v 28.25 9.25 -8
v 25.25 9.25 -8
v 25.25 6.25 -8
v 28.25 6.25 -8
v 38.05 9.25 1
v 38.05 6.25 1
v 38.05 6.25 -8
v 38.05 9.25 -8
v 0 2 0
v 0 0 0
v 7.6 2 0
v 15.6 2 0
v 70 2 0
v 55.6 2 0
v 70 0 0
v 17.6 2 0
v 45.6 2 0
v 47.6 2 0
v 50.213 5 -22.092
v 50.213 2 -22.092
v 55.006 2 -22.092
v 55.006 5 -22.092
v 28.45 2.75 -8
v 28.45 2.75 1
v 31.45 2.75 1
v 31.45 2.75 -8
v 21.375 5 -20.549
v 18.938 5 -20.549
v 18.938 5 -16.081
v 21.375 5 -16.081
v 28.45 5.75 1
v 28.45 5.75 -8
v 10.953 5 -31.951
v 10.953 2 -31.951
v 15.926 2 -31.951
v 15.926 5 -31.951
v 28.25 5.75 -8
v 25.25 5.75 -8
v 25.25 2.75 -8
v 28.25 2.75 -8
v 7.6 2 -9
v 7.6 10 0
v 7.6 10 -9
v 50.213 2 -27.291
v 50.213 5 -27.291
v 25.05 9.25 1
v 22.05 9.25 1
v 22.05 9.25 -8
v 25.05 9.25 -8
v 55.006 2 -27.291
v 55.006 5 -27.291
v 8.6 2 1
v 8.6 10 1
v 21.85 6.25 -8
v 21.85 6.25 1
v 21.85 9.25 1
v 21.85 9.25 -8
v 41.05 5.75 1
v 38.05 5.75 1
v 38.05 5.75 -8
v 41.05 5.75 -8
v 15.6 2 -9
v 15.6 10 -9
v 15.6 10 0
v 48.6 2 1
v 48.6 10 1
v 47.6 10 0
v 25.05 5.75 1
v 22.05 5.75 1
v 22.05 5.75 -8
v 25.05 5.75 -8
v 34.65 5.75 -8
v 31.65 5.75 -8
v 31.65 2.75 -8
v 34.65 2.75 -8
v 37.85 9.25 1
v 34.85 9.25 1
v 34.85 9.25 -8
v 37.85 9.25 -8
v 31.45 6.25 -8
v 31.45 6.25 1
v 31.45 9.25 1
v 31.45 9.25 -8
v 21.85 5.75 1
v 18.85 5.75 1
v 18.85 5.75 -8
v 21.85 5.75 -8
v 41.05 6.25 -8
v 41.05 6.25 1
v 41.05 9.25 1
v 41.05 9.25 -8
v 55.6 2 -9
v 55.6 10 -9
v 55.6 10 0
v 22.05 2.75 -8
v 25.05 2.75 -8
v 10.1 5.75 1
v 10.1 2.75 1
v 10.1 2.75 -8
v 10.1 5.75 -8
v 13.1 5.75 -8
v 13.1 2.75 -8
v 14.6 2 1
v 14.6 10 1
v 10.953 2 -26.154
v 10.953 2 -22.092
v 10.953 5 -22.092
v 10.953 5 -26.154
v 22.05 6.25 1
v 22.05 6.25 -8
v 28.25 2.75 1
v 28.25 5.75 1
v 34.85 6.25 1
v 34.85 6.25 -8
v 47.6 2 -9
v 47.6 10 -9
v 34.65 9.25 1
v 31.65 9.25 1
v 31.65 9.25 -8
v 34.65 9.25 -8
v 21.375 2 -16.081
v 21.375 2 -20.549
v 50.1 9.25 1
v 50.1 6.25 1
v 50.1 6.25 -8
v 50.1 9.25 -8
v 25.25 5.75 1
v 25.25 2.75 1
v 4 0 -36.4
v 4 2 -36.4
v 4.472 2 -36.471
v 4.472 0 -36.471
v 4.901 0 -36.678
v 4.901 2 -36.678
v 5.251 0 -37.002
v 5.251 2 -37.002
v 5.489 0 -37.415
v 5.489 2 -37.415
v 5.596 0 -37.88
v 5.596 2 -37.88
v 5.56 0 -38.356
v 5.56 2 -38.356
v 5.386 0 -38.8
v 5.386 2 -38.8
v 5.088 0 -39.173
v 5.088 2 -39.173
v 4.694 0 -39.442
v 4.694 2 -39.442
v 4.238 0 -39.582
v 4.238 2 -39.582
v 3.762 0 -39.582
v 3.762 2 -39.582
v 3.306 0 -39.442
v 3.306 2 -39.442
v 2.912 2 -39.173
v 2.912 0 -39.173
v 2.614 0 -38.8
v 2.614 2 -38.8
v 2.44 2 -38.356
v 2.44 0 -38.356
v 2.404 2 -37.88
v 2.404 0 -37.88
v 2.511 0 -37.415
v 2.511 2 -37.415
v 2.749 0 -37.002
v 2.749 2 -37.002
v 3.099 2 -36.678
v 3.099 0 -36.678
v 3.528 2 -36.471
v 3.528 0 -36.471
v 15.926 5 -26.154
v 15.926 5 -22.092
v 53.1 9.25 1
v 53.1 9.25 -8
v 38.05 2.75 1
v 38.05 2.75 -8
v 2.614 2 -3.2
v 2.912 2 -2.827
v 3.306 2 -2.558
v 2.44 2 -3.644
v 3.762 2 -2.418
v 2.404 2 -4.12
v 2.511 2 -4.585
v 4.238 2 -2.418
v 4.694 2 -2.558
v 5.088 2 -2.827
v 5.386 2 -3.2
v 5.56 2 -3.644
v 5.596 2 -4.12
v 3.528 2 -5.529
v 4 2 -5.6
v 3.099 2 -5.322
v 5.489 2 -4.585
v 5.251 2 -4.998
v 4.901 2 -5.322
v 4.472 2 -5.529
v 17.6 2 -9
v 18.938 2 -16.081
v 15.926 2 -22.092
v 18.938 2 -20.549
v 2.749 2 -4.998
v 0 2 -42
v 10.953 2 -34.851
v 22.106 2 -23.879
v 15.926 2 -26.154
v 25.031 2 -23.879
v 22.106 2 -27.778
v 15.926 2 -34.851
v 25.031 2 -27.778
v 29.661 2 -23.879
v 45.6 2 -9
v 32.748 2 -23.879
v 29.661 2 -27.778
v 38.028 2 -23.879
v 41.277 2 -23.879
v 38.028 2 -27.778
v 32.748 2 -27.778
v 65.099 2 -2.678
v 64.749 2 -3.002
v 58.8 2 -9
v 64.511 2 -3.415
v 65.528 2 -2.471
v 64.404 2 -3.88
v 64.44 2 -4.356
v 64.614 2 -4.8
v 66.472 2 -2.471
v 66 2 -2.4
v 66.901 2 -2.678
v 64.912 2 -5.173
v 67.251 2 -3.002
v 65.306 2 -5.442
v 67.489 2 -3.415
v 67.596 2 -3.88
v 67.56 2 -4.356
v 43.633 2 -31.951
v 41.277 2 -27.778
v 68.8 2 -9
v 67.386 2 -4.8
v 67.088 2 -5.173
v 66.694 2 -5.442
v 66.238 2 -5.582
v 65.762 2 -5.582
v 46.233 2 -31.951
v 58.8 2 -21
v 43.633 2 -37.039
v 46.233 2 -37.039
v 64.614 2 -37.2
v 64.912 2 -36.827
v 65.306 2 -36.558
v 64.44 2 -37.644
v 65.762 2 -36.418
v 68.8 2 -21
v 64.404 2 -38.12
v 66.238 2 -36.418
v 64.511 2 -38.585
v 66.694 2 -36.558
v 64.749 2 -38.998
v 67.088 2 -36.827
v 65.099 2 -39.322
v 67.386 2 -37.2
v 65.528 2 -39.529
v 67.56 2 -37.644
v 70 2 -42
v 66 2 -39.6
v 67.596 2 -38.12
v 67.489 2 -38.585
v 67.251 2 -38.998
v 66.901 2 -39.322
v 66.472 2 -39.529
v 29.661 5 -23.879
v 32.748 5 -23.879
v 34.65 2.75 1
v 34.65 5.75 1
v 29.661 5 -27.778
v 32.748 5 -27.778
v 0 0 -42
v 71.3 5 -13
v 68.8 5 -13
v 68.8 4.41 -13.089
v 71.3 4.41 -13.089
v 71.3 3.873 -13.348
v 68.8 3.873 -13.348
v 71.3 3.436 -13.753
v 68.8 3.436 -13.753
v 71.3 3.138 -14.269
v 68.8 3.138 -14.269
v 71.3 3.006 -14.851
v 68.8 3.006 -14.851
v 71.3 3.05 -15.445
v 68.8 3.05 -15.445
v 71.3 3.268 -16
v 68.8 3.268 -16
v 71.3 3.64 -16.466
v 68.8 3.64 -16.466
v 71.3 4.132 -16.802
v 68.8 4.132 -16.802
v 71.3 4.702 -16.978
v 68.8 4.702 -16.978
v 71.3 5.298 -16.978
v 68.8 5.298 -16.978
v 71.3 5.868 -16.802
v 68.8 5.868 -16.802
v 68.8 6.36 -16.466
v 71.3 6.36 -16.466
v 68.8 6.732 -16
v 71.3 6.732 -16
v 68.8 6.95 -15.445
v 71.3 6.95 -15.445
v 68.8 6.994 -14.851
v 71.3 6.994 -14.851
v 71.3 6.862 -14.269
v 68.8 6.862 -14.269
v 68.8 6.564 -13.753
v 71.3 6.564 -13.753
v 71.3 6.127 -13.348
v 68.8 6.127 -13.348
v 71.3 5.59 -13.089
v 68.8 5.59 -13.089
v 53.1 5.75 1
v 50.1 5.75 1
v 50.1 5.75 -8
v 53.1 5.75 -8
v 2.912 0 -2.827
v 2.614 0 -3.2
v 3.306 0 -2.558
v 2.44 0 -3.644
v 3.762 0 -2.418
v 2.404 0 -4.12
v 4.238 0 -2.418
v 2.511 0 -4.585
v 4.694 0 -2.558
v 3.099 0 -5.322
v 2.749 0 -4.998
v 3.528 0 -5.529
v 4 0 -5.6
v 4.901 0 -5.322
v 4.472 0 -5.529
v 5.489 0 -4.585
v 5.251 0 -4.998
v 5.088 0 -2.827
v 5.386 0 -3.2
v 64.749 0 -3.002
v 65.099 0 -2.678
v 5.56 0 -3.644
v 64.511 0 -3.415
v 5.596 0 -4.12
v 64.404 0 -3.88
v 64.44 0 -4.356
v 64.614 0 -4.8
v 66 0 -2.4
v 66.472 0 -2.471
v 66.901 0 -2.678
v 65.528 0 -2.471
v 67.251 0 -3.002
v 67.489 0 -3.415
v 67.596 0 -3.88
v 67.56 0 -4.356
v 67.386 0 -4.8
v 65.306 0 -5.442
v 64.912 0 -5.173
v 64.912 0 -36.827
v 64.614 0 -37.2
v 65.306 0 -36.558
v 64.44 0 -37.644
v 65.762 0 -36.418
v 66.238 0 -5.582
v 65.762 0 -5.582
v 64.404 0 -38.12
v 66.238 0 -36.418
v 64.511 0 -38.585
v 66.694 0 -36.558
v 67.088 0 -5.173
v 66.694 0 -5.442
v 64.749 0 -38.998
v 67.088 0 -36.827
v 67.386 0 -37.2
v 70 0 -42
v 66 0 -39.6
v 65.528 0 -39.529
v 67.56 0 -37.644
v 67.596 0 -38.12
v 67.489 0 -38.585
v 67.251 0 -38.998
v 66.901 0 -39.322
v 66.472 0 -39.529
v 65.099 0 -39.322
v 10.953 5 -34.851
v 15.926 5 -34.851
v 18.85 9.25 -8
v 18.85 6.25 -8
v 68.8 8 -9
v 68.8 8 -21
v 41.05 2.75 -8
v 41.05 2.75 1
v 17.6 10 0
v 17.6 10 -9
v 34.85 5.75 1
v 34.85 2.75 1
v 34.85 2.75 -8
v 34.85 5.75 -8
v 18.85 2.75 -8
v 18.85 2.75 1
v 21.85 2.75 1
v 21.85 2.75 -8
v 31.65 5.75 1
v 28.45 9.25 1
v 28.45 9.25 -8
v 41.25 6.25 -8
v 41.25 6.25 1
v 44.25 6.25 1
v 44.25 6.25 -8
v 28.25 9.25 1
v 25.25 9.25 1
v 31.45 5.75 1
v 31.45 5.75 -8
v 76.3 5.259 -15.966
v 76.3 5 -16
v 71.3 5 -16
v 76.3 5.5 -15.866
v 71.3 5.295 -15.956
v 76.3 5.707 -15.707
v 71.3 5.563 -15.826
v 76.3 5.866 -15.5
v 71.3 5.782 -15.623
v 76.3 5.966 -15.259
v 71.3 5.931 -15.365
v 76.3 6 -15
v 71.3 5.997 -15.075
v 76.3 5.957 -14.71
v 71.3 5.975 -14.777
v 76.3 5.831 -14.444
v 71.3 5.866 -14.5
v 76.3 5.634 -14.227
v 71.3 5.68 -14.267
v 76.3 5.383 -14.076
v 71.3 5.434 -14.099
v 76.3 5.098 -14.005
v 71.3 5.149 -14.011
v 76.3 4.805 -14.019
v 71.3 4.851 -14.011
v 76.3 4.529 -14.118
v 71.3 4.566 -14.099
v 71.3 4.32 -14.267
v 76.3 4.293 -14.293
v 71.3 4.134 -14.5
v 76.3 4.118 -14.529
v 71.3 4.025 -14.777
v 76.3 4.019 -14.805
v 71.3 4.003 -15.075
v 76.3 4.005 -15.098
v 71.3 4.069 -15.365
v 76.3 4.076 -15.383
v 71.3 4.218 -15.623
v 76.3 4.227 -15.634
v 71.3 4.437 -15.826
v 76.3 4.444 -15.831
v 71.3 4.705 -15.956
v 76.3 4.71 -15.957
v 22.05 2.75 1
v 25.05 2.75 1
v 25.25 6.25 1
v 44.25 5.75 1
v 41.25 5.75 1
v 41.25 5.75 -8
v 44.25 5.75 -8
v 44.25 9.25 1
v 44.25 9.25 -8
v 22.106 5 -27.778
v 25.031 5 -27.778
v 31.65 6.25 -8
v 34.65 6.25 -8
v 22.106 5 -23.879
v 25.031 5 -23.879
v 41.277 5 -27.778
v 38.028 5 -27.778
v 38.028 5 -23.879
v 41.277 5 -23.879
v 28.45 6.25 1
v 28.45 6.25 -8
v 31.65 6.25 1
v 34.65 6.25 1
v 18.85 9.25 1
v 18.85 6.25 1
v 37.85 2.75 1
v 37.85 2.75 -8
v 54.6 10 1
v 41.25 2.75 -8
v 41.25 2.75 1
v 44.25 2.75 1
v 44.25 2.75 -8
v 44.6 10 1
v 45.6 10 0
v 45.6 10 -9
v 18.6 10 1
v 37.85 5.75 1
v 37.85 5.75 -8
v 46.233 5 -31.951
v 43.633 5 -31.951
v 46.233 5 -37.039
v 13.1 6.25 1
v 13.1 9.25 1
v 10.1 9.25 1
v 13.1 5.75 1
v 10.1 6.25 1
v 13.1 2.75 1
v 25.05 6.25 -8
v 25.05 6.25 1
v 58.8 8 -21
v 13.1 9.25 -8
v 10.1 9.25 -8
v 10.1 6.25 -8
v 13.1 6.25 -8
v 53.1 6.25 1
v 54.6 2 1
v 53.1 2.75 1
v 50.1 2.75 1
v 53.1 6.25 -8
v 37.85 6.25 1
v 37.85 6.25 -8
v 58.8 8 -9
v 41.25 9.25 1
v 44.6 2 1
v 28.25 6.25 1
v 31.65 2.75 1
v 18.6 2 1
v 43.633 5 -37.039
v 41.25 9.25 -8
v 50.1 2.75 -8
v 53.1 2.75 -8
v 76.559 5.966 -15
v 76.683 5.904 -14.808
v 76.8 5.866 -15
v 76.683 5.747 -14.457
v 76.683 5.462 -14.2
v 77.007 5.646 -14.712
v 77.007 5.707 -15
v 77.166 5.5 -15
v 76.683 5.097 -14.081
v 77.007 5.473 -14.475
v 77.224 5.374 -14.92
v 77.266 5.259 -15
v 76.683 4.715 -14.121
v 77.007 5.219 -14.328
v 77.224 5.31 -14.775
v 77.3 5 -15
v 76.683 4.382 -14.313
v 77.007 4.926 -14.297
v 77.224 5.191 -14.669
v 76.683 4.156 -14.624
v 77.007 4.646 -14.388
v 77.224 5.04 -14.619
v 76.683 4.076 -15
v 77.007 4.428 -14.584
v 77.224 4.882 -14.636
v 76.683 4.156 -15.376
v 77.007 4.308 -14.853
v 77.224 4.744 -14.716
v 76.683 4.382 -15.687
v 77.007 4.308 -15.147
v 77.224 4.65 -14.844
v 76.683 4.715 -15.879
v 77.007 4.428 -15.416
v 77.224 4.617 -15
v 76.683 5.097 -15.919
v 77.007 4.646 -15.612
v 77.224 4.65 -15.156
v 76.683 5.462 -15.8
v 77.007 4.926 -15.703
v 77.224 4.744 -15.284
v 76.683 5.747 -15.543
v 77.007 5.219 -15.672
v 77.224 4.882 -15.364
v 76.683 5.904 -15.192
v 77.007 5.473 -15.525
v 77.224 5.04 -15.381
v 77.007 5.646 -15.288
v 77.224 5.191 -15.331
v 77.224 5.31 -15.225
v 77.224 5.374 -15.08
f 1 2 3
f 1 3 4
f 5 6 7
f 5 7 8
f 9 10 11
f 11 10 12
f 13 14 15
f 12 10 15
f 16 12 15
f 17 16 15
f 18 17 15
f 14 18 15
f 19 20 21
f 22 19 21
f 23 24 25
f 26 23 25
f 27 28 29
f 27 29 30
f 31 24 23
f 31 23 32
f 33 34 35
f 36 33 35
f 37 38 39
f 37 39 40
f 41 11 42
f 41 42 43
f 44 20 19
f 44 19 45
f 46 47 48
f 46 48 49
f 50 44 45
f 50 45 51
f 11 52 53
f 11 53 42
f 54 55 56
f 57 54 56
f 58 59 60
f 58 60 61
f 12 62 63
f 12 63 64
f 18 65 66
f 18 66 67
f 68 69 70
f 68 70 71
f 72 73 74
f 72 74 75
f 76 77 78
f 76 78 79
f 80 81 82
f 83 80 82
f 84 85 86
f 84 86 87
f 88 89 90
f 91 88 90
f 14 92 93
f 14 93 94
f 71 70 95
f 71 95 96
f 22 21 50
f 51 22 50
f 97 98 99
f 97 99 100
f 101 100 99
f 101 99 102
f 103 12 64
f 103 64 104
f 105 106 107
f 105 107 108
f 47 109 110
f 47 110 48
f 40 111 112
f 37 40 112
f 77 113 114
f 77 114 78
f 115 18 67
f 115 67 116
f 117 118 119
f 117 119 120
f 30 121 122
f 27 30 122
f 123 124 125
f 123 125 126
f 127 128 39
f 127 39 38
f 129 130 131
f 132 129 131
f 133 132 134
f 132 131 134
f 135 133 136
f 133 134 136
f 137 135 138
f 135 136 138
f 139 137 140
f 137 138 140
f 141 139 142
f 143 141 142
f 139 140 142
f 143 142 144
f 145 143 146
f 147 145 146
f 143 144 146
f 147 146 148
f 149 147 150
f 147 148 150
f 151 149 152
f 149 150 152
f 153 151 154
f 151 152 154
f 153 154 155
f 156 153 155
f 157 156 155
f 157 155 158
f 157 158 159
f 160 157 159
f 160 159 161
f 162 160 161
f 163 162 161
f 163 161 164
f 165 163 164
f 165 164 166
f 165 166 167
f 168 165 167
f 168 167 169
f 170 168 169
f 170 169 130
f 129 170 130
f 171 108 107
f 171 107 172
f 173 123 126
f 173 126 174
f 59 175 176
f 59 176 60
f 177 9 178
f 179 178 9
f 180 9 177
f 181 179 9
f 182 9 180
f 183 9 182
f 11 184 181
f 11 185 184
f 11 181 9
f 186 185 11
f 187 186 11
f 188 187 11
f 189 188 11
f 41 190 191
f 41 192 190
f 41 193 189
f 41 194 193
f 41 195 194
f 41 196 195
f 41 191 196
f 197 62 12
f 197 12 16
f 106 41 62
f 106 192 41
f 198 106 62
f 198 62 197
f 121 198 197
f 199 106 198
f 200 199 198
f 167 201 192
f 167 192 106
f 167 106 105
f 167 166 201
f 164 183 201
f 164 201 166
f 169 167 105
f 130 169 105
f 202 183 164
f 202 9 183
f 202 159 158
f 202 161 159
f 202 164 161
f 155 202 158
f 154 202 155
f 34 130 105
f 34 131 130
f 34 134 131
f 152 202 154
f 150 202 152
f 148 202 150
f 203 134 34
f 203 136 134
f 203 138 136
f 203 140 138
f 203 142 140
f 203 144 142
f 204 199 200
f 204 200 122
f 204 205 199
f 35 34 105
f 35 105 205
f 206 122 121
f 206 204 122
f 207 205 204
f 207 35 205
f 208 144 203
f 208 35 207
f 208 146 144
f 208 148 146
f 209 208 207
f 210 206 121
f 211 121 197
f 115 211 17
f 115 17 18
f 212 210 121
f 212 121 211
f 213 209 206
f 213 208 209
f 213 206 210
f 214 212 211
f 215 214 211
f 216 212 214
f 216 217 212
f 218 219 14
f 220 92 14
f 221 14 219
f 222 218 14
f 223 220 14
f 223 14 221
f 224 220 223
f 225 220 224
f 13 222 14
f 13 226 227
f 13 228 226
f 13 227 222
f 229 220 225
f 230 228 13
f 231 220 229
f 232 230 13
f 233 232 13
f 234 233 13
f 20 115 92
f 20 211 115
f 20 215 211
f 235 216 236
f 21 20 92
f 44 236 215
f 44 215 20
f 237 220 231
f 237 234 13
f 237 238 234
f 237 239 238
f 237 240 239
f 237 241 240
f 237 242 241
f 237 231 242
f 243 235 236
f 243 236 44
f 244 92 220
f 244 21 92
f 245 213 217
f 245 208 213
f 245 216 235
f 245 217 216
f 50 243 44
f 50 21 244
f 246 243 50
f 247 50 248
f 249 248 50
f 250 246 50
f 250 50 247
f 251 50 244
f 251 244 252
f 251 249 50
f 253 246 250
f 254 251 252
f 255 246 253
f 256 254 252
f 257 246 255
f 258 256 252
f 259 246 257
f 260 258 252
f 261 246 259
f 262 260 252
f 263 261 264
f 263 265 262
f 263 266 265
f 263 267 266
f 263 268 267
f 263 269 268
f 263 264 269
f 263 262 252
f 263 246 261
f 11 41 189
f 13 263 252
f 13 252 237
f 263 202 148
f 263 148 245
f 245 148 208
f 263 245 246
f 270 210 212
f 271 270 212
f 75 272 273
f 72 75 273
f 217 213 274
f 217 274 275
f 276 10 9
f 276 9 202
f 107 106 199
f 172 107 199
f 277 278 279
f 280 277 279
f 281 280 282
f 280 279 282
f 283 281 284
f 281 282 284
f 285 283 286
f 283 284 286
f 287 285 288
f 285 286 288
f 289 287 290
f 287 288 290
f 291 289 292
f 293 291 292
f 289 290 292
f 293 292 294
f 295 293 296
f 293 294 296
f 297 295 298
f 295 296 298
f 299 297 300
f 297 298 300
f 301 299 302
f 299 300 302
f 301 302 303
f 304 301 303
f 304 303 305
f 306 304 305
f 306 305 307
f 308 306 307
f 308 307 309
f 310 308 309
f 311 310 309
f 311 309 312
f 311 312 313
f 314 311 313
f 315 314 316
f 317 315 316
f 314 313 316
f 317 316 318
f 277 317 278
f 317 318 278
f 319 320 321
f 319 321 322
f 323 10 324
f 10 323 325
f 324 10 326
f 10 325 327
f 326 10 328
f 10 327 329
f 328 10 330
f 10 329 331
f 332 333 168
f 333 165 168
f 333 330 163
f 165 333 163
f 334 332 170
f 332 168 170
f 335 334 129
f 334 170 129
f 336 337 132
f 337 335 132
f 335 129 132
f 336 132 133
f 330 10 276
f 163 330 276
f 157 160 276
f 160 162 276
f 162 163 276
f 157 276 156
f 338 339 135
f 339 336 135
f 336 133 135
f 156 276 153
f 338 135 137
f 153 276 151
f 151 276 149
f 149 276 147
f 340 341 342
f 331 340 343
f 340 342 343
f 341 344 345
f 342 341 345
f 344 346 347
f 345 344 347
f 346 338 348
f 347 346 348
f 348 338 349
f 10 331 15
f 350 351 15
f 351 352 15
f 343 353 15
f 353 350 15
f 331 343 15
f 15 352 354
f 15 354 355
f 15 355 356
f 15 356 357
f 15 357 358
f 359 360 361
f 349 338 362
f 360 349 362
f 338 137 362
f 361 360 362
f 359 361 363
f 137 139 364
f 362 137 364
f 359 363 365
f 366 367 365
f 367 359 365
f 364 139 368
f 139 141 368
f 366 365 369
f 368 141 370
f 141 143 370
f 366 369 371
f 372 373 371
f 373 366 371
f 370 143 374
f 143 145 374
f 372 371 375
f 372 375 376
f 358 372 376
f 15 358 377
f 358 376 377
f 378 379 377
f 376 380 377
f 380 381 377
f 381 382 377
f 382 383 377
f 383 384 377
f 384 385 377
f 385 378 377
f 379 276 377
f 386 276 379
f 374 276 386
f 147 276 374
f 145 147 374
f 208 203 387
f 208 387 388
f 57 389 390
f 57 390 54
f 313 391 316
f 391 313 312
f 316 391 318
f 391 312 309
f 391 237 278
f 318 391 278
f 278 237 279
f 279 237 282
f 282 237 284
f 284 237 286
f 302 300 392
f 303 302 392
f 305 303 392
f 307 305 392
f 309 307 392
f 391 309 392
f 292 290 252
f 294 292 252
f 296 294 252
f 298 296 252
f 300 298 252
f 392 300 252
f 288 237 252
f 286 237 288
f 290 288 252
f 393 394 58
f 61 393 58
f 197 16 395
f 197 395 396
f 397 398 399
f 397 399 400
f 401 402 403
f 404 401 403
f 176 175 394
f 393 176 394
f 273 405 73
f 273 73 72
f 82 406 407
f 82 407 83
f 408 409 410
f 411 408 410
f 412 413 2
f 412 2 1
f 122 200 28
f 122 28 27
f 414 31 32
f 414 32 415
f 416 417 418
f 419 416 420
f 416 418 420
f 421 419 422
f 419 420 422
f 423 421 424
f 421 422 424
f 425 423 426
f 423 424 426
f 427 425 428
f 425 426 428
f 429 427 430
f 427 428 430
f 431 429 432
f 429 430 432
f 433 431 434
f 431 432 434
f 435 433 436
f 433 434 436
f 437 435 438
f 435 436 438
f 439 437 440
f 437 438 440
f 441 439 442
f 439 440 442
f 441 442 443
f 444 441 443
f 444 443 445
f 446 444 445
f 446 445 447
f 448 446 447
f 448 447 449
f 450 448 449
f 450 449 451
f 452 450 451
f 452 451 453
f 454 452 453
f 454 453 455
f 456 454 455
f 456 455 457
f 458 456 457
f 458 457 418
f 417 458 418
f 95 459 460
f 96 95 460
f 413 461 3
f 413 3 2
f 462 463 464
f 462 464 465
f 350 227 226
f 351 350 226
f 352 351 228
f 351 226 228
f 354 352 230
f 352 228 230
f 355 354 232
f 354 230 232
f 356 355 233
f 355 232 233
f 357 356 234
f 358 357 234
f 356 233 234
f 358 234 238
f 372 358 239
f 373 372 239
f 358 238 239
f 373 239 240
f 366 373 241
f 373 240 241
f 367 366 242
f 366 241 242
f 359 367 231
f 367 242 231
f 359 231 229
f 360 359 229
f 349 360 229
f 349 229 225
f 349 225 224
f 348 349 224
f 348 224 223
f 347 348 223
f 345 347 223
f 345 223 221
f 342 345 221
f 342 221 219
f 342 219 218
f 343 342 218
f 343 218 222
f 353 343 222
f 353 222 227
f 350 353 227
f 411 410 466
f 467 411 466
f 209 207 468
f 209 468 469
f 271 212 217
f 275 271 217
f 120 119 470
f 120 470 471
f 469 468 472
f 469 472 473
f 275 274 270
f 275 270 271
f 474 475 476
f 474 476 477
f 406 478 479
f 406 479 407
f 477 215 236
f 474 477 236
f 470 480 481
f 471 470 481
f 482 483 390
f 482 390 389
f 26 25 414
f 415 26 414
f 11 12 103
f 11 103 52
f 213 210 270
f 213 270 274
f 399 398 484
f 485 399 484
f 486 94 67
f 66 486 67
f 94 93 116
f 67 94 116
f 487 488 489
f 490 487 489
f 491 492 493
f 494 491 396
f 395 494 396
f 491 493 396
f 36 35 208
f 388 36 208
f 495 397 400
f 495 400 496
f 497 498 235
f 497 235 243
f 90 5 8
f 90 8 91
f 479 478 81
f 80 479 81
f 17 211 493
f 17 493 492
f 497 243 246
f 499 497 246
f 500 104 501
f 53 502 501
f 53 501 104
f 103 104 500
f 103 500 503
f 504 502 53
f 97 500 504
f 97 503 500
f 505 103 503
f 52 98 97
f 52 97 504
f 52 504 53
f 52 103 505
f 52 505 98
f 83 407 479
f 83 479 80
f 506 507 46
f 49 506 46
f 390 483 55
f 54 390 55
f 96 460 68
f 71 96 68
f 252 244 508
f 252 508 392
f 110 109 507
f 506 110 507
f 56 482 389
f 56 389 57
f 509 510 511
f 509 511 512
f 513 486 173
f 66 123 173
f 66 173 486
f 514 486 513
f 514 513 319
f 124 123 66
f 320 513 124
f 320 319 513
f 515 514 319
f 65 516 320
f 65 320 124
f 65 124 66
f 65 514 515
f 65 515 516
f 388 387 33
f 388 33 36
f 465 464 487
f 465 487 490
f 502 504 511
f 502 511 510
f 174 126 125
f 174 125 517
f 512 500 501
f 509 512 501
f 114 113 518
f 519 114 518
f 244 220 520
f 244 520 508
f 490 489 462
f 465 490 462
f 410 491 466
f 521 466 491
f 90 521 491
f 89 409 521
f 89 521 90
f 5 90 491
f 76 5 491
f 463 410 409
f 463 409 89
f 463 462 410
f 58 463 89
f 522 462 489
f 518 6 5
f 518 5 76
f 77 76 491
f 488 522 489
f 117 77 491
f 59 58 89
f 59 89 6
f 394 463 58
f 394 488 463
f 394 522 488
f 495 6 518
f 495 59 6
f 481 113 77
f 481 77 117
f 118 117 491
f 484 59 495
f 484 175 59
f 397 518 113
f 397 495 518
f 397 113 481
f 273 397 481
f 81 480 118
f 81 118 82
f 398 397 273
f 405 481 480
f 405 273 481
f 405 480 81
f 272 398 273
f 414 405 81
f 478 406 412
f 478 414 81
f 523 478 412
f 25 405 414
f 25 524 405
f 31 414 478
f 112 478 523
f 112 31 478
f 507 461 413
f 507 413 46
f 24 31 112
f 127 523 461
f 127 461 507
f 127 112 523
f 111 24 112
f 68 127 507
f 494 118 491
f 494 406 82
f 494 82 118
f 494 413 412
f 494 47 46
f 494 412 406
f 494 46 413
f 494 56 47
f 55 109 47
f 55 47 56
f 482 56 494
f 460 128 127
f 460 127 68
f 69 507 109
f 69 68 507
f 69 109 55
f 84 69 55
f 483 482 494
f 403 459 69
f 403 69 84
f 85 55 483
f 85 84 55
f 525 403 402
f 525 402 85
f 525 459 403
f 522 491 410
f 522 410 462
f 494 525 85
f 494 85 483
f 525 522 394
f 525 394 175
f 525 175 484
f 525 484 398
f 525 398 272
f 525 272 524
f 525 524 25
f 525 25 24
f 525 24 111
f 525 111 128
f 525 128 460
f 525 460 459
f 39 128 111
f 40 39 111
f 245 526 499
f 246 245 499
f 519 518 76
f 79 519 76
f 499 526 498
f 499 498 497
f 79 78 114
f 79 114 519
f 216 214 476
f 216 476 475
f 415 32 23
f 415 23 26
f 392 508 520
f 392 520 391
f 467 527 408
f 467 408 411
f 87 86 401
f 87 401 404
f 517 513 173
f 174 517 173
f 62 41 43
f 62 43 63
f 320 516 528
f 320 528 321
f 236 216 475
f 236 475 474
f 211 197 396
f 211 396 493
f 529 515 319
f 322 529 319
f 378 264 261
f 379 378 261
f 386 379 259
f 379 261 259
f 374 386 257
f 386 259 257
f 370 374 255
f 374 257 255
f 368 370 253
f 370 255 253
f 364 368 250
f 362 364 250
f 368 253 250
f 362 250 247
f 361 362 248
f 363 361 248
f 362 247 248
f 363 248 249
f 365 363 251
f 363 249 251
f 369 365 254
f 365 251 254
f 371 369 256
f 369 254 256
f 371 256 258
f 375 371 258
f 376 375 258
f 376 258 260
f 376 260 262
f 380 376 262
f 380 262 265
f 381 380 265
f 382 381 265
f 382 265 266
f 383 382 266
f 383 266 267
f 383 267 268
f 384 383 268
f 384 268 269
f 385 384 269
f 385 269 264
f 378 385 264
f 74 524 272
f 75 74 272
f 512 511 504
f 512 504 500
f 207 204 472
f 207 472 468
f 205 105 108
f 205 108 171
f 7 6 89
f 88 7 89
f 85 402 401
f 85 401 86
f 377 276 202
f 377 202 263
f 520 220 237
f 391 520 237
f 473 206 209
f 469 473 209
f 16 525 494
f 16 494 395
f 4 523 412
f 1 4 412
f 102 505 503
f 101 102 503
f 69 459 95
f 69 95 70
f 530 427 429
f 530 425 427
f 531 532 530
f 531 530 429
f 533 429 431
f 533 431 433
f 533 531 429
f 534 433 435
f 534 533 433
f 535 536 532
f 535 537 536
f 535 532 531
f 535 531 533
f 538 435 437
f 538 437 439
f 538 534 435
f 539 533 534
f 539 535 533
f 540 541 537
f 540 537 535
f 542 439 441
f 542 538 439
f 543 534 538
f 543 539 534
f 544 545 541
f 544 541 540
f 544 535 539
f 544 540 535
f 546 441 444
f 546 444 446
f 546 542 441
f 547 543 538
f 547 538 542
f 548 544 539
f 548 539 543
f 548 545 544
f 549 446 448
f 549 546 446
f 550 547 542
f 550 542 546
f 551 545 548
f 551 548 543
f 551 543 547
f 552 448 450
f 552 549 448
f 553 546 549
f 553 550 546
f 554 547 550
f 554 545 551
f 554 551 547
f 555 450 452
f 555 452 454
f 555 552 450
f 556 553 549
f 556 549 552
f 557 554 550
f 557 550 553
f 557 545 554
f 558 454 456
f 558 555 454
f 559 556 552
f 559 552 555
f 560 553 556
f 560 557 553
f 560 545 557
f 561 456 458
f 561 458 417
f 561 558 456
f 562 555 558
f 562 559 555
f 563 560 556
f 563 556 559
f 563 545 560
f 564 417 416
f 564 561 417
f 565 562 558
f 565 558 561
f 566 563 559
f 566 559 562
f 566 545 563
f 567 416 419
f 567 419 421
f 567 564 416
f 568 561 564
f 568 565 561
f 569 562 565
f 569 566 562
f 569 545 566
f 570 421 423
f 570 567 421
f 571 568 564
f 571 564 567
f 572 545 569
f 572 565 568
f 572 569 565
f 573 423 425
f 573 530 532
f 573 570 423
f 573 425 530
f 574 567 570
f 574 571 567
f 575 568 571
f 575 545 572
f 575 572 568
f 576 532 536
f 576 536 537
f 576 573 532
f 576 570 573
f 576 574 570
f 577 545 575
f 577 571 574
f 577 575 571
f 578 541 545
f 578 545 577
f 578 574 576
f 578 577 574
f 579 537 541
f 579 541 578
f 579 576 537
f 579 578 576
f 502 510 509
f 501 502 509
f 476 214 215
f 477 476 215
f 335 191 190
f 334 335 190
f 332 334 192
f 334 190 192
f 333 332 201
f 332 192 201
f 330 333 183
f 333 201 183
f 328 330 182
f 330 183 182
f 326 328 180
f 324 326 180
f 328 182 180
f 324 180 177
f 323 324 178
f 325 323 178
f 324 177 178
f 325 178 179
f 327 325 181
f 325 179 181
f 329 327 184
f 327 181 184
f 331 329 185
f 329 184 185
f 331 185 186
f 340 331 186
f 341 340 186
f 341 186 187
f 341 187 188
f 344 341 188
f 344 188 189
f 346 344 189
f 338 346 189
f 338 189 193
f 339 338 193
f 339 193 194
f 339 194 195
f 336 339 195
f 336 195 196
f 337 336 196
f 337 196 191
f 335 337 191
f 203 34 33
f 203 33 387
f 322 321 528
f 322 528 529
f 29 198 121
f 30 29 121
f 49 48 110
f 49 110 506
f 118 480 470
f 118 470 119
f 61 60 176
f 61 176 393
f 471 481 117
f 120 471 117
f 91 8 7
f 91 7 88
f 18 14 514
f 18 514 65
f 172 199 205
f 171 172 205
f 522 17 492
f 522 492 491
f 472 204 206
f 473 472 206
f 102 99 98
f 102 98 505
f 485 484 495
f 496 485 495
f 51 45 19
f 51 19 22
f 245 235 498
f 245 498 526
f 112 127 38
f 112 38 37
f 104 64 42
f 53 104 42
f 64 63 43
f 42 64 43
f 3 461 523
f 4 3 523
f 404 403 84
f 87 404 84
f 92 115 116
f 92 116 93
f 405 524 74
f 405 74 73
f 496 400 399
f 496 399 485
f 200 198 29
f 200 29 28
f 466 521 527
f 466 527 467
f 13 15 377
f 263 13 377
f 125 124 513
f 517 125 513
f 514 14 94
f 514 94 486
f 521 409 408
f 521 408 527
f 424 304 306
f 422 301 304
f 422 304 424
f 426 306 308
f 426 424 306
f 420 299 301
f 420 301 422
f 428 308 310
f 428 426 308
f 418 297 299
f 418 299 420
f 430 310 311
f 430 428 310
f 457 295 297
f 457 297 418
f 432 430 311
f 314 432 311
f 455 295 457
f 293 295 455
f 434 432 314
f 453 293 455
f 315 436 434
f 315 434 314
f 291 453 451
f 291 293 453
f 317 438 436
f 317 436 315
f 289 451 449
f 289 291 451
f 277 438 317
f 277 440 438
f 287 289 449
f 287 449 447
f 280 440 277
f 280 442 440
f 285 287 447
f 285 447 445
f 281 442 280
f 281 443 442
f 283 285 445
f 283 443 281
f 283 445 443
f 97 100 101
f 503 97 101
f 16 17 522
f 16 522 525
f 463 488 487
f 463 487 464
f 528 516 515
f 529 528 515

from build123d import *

# Parameters (mm, degrees)
SKETCH1_W           = 70
SKETCH1_H           = 42
BOSS_EXTRUDE1_DEPTH = 2
SKETCH4_R           = 1.6
CUT_EXTRUDE2_DEPTH  = 82.65782265
BOSS_EXTRUDE2_DEPTH = 8
SKETCH6_W           = 3
SKETCH6_H           = 3
CUT_EXTRUDE3_DEPTH  = 9
SKETCH7_W           = 10
SKETCH7_H           = 12
BOSS_EXTRUDE3_DEPTH = 6
SKETCH8_R           = 2
BOSS_EXTRUDE4_DEPTH = 2.5
SKETCH9_R           = 1
BOSS_EXTRUDE5_DEPTH = 5
SKETCH10_W          = 4.972668361
SKETCH10_H          = 2.900723211
SKETCH10_H_2        = 4.06167287
SKETCH10_W_2        = 4.792773987
SKETCH10_H_3        = 5.198941274
SKETCH10_W_3        = 2.924404467
SKETCH10_H_4        = 3.899205956
SKETCH10_W_4        = 3.086871382
SKETCH10_W_5        = 3.249338296
SKETCH10_W_6        = 2.437003722
SKETCH10_H_5        = 4.467840158
SKETCH10_W_7        = 2.599470637
SKETCH10_H_6        = 5.088357614
BOSS_EXTRUDE6_DEPTH = 3


# Read off the part's stored shape, not the designer's step: Dome1
with BuildPart() as part:
    # Sketch1 → Boss-Extrude1 (new body)
    with BuildSketch(Plane(origin=(0, 0, 0), x_dir=(1, 0, 0), z_dir=(0, 1, 0))):
        with Locations((35, 21)):
            Rectangle(SKETCH1_W, SKETCH1_H)
    extrude(amount=BOSS_EXTRUDE1_DEPTH)

    # Sketch4 → Cut-Extrude2 (cut, through all)
    with BuildSketch(Plane(origin=(0, 2, 0), x_dir=(1, 0, 0), z_dir=(0, 1, 0))):
        with Locations(Location((4, 38, 0), (0, 0, 270))):
            Circle(SKETCH4_R)
        with Locations(Location((66, 4, 0), (0, 0, 270))):
            Circle(SKETCH4_R)
        with Locations(Location((4, 4, 0), (0, 0, 90))):
            Circle(SKETCH4_R)
        with Locations(Location((66, 38, 0), (0, 0, 90))):
            Circle(SKETCH4_R)
    extrude(amount=-CUT_EXTRUDE2_DEPTH, mode=Mode.SUBTRACT)

    # Sketch5 → Boss-Extrude2 (add)
    with BuildSketch(Plane(origin=(0, 2, 0), x_dir=(1, 0, 0), z_dir=(0, 1, 0))):
        Polygon((17.6, 9), (45.6, 9), (45.6, 0), (44.6, -1), (18.6, -1), (17.6, 0), align=None)
        Polygon((7.6, 9), (15.6, 9), (15.6, 0), (14.6, -1), (8.6, -1), (7.6, 0), align=None)
        Polygon((47.6, 9), (55.6, 9), (55.6, 0), (54.6, -1), (48.6, -1), (47.6, 0), align=None)
    extrude(amount=BOSS_EXTRUDE2_DEPTH)

    # Sketch6 → Cut-Extrude3 (cut)
    with BuildSketch(Plane.XY.offset(1)):
        with Locations((20.35, 4.25)):
            Rectangle(SKETCH6_W, SKETCH6_H)
        with Locations((11.6, 7.75)):
            Rectangle(SKETCH6_W, SKETCH6_H)
        with Locations((23.55, 4.25)):
            Rectangle(SKETCH6_W, SKETCH6_H)
        with Locations((11.6, 4.25)):
            Rectangle(SKETCH6_W, SKETCH6_H)
        with Locations((20.35, 7.75)):
            Rectangle(SKETCH6_W, SKETCH6_H)
        with Locations((51.6, 7.75)):
            Rectangle(SKETCH6_W, SKETCH6_H)
        with Locations((23.55, 7.75)):
            Rectangle(SKETCH6_W, SKETCH6_H)
        with Locations((26.75, 4.25)):
            Rectangle(SKETCH6_W, SKETCH6_H)
        with Locations((26.75, 7.75)):
            Rectangle(SKETCH6_W, SKETCH6_H)
        with Locations((29.95, 4.25)):
            Rectangle(SKETCH6_W, SKETCH6_H)
        with Locations((29.95, 7.75)):
            Rectangle(SKETCH6_W, SKETCH6_H)
        with Locations((33.15, 4.25)):
            Rectangle(SKETCH6_W, SKETCH6_H)
        with Locations((33.15, 7.75)):
            Rectangle(SKETCH6_W, SKETCH6_H)
        with Locations((36.35, 4.25)):
            Rectangle(SKETCH6_W, SKETCH6_H)
        with Locations((36.35, 7.75)):
            Rectangle(SKETCH6_W, SKETCH6_H)
        with Locations((39.55, 4.25)):
            Rectangle(SKETCH6_W, SKETCH6_H)
        with Locations((39.55, 7.75)):
            Rectangle(SKETCH6_W, SKETCH6_H)
        with Locations((42.75, 4.25)):
            Rectangle(SKETCH6_W, SKETCH6_H)
        with Locations((42.75, 7.75)):
            Rectangle(SKETCH6_W, SKETCH6_H)
        with Locations((51.6, 4.25)):
            Rectangle(SKETCH6_W, SKETCH6_H)
    extrude(amount=-CUT_EXTRUDE3_DEPTH, mode=Mode.SUBTRACT)

    # Sketch7 → Boss-Extrude3 (add)
    with BuildSketch(Plane(origin=(0, 2, 0), x_dir=(1, 0, 0), z_dir=(0, 1, 0))):
        with Locations((63.8, 15)):
            Rectangle(SKETCH7_W, SKETCH7_H)
    extrude(amount=BOSS_EXTRUDE3_DEPTH)

    # Sketch8 → Boss-Extrude4 (add)
    with BuildSketch(Plane(origin=(68.8, 0, 0), x_dir=(0, 0, -1), z_dir=(1, 0, 0))):
        with Locations(Location((15, 5, 0), (0, 0, 180))):
            Circle(SKETCH8_R)
    extrude(amount=BOSS_EXTRUDE4_DEPTH)

    # Sketch9 → Boss-Extrude5 (add)
    with BuildSketch(Plane(origin=(71.3, 0, 0), x_dir=(0, 0, -1), z_dir=(1, 0, 0))):
        with Locations((15, 5)):
            Circle(SKETCH9_R)
    extrude(amount=BOSS_EXTRUDE5_DEPTH)

    # Dome1 outline → Dome1 (revolve)
    with BuildSketch(Plane(origin=(0, 5, -15), x_dir=(0, 1, 0), z_dir=(0, 0, -1))):
        with BuildLine():
            Line((0, 76.3), (1, 76.299999999))
            ThreePointArc((1, 76.299999999), (0.707106782, 77.007106781), (0, 77.3))
            Line((0, 77.3), (0, 76.3))
        make_face()
    revolve(axis=Axis((0, 5, -15), (1, 0, 0)))

    # Sketch10 → Boss-Extrude6 (add)
    with BuildSketch(Plane(origin=(0, 2, 0), x_dir=(1, 0, 0), z_dir=(0, 1, 0))):
        with Locations((13.43956041, 33.400988797)):
            Rectangle(SKETCH10_W, SKETCH10_H)
        with Locations((13.43956041, 24.122865076)):
            Rectangle(SKETCH10_W, SKETCH10_H_2)
        with Locations((52.609554771, 24.691499278)):
            Rectangle(SKETCH10_W_2, SKETCH10_H_3)
        with Locations((23.568593744, 25.828767682)):
            Rectangle(SKETCH10_W_3, SKETCH10_H_4)
        with Locations((31.204538742, 25.828767682)):
            Rectangle(SKETCH10_W_4, SKETCH10_H_4)
        with Locations((39.652818313, 25.828767682)):
            Rectangle(SKETCH10_W_5, SKETCH10_H_4)
        with Locations((20.156788533, 18.314672871)):
            Rectangle(SKETCH10_W_6, SKETCH10_H_5)
        with Locations((44.932993045, 34.494805998)):
            Rectangle(SKETCH10_W_7, SKETCH10_H_6)
    extrude(amount=BOSS_EXTRUDE6_DEPTH)


solid = part.part
